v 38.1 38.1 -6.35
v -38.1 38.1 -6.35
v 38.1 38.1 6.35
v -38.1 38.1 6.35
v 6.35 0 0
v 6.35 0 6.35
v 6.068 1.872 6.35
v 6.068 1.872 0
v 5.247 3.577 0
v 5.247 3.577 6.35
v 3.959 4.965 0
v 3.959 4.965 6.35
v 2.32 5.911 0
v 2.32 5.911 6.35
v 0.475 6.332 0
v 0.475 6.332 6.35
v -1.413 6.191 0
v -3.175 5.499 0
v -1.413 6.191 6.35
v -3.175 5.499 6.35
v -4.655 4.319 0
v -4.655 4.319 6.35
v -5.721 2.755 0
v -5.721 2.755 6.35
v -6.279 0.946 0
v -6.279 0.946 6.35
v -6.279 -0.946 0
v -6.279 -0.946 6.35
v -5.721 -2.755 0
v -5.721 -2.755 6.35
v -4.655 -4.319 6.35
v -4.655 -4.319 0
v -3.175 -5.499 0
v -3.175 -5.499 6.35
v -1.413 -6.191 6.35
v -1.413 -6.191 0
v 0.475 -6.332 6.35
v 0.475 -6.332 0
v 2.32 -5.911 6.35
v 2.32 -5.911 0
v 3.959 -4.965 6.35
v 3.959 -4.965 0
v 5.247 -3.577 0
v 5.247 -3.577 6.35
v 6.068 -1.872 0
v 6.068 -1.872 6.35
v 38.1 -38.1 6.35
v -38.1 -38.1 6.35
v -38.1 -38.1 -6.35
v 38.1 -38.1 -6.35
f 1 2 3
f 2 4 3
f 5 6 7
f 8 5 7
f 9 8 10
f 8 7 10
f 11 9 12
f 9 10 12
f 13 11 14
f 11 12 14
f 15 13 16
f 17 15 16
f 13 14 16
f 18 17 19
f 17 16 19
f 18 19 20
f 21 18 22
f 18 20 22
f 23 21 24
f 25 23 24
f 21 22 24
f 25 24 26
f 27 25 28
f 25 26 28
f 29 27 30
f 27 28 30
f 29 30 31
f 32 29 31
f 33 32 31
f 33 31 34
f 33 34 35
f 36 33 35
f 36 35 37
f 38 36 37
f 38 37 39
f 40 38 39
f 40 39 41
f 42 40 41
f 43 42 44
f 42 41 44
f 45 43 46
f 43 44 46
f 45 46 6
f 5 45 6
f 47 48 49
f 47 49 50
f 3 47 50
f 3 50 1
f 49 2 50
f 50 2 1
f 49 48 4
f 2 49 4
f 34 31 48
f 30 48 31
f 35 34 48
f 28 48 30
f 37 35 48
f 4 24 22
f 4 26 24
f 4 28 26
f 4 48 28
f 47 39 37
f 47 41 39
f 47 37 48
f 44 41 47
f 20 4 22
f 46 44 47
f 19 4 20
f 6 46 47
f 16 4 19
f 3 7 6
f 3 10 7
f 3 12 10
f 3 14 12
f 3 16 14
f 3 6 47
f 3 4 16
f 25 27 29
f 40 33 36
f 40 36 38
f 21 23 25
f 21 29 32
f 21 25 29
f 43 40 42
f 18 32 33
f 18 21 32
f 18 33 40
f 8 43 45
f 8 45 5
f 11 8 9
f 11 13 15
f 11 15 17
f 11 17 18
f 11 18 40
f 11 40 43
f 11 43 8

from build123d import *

# Parameters (mm, degrees)
F0_W     = 76.2
F0_H     = 76.2
F1_DEPTH = 6.35
F2_R     = 6.35
F3_DEPTH = 6.35


with BuildPart() as f1:
    # F0 (on Top) → F1 (new body, symmetric)
    with BuildSketch(Plane.XY):
        Rectangle(F0_W, F0_H)
    extrude(amount=F1_DEPTH, both=True)

    # F2 (on face) → F3 (cut)
    with BuildSketch(Plane.XY.offset(6.35)):
        Circle(F2_R)
    extrude(amount=-F3_DEPTH, mode=Mode.SUBTRACT)


solid = f1.part
